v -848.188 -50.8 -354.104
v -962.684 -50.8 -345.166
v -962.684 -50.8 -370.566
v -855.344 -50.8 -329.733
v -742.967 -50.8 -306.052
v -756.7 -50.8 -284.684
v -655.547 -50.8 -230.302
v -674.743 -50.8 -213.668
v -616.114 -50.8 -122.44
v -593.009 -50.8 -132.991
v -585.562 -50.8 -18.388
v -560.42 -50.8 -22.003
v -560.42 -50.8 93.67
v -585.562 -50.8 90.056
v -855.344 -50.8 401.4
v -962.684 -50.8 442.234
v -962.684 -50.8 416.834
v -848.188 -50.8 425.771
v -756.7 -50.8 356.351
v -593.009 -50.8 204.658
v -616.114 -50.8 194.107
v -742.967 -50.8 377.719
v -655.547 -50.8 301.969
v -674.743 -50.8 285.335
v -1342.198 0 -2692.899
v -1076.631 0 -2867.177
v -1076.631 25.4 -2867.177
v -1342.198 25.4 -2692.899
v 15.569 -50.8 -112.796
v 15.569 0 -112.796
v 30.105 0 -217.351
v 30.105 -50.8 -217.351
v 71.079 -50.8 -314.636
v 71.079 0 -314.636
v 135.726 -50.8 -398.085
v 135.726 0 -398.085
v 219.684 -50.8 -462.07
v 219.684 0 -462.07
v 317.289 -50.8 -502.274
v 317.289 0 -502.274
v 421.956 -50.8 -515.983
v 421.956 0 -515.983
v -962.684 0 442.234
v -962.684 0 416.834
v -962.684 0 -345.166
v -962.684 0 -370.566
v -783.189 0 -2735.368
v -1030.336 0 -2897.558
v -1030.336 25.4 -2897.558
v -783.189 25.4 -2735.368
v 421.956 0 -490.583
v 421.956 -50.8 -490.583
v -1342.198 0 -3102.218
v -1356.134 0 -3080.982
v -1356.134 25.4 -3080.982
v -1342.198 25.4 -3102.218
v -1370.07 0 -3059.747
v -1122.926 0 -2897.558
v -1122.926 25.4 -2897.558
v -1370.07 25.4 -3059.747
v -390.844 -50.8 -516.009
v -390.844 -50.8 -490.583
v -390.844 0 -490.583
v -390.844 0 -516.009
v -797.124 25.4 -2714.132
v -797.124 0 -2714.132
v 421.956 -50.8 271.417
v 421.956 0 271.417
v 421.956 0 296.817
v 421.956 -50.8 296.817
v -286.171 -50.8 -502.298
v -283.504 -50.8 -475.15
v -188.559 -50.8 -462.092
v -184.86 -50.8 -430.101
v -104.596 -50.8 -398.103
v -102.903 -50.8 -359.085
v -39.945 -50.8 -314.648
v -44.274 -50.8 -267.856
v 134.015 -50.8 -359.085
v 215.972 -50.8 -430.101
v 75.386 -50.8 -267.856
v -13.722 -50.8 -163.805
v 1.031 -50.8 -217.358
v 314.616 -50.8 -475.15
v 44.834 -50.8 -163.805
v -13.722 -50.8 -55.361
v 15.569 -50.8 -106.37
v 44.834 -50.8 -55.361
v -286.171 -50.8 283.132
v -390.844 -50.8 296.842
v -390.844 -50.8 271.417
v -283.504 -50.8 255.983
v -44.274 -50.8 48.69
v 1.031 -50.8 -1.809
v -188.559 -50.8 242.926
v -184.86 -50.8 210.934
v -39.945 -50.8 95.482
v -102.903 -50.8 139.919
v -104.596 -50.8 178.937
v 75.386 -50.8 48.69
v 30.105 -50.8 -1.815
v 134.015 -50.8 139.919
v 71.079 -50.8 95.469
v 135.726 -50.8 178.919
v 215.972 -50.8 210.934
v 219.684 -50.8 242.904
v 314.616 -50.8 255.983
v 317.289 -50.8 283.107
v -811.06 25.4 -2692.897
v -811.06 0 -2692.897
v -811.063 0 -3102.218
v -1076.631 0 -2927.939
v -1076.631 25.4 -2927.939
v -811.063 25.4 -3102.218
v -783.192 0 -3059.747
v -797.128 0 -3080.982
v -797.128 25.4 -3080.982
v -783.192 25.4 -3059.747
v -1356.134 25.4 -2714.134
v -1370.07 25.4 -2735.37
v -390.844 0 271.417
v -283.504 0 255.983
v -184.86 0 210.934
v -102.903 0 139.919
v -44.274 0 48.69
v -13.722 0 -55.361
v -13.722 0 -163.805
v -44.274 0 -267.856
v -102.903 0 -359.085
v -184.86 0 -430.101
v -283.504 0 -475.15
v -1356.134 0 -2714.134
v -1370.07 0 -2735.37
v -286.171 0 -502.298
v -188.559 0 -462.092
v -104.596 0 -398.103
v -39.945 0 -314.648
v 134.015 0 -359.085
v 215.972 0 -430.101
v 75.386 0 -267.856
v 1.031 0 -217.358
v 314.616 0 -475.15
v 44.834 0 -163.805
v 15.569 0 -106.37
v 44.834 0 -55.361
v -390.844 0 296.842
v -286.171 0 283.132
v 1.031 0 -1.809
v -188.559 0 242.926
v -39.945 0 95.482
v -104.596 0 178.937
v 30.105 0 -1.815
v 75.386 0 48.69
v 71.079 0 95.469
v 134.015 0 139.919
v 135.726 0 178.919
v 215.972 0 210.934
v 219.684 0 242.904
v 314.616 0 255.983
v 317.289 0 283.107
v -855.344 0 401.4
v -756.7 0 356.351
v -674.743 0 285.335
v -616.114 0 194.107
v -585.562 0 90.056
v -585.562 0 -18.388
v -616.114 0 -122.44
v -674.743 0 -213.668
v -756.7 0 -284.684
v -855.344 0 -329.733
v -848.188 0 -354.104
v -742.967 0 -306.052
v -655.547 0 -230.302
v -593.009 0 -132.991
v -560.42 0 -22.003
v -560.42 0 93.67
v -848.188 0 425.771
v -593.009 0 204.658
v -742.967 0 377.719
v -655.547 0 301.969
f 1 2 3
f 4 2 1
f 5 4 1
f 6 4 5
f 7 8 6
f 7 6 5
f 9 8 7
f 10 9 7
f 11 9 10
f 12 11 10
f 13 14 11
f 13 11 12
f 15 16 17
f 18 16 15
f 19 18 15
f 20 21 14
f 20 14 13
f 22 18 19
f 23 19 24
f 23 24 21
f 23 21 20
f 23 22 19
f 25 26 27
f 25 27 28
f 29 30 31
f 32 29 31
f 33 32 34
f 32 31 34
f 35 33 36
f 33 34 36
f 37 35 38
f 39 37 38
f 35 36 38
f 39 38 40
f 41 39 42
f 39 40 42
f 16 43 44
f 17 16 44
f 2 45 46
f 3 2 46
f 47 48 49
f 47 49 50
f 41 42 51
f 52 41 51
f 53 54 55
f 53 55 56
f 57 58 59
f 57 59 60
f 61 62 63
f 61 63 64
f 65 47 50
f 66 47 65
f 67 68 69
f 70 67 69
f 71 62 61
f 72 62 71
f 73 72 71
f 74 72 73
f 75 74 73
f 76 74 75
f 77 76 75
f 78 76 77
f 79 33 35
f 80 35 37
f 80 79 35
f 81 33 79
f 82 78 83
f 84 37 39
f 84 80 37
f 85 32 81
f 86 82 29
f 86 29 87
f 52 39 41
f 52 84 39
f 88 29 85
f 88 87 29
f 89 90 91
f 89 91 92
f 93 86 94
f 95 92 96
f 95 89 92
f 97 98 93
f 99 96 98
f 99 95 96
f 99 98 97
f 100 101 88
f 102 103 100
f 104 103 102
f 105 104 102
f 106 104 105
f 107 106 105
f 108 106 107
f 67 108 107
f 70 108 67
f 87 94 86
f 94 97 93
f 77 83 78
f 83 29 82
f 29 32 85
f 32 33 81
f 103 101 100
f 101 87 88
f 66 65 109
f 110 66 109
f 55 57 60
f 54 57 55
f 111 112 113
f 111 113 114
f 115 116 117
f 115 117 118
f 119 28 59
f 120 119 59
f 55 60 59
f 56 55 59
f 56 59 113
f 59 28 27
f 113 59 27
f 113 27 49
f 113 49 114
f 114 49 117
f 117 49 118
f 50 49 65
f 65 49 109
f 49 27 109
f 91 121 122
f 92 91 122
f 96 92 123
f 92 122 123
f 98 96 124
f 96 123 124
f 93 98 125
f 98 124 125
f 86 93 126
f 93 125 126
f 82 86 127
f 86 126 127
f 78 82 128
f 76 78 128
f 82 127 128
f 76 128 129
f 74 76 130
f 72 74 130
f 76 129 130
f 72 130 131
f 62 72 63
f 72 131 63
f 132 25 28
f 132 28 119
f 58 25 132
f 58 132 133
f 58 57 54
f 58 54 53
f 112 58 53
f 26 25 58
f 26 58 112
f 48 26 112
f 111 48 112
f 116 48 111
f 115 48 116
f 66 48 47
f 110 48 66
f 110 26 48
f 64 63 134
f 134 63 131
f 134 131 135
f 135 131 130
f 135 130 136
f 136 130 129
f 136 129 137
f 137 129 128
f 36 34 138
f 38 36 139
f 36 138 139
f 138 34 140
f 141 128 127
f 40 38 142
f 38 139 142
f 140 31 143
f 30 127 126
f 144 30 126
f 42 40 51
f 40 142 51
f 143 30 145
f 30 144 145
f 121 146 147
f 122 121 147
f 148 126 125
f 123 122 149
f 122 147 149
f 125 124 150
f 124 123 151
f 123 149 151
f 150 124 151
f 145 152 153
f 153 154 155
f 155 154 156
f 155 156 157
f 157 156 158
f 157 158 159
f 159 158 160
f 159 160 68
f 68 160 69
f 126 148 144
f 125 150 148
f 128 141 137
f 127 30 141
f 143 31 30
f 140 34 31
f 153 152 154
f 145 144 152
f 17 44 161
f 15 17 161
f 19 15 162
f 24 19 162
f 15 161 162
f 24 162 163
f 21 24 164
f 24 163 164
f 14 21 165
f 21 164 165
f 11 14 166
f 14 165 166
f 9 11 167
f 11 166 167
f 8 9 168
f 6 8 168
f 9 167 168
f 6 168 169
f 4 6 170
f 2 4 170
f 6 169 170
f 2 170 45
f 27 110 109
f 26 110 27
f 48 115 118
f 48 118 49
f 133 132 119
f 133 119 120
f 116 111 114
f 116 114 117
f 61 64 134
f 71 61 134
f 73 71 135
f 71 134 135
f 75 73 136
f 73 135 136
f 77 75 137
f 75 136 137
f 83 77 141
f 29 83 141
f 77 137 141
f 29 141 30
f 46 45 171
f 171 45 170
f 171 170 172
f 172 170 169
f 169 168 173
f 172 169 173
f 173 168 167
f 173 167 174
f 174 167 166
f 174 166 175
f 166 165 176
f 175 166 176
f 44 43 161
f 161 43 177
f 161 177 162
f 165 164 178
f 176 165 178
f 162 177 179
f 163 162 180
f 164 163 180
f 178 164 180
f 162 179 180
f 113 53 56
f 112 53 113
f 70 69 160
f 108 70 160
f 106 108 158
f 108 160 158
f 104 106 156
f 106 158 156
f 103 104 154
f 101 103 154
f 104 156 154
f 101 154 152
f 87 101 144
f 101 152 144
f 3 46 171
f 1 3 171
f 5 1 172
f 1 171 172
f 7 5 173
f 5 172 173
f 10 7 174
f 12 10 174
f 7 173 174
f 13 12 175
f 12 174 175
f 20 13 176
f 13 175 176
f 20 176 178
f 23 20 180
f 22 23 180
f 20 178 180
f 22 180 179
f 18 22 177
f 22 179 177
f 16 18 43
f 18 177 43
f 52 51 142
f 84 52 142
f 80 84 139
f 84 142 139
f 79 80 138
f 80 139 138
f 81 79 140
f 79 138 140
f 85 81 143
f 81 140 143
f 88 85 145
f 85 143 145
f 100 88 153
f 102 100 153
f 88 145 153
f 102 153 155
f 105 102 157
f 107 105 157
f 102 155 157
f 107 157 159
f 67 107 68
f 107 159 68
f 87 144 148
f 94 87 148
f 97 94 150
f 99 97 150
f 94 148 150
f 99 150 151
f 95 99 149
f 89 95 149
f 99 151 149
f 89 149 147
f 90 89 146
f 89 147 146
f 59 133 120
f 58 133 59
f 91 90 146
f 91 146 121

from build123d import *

# Parameters (mm, degrees)
F1_DEPTH = 50.8
F3_DEPTH = 50.8
F4_DEPTH = 25.4


with BuildPart() as f1:
    # F0 (on Front) → F1 (new body)
    with BuildSketch(Plane.XZ):
        with BuildLine():
            ThreePointArc((15.568727, -106.370451), (-104.596003, 178.936502), (-390.843974, 296.84205))
            Line((-390.843974, 296.84205), (-390.843974, 271.41665))
            ThreePointArc((-390.843974, 271.41665), (-9.843974, -109.58335), (-390.843974, -490.58335))
            Line((-390.843974, -490.58335), (-390.843974, -515.98335))
            Line((-390.843974, -515.98335), (-390.843974, -516.00875))
            ThreePointArc((-390.843974, -516.00875), (-104.596003, -398.103202), (15.568727, -112.796249))
            ThreePointArc((15.568727, -112.796249), (15.556026, -109.58335), (15.568727, -106.370451))
        make_face()
        with BuildLine():
            ThreePointArc((421.956026, 296.81665), (135.726016, 178.918541), (15.568727, -106.370451))
            ThreePointArc((15.568727, -106.370451), (15.556026, -109.58335), (15.568727, -112.796249))
            ThreePointArc((15.568727, -112.796249), (135.726016, -398.085241), (421.956026, -515.98335))
            Line((421.956026, -515.98335), (421.956026, -490.58335))
            ThreePointArc((421.956026, -490.58335), (40.956026, -109.58335), (421.956026, 271.41665))
            Line((421.956026, 271.41665), (421.956026, 296.81665))
        make_face()
    extrude(amount=F1_DEPTH)


with BuildPart() as f3:
    # F2 (on Front) → F3 (new body)
    with BuildSketch(Plane.XZ):
        with BuildLine():
            Line((-962.683797, -345.16645), (-962.683797, -370.56645))
            ThreePointArc((-962.683797, -370.56645), (-556.283797, 35.83355), (-962.683797, 442.23355))
            Line((-962.683797, 442.23355), (-962.683797, 416.83355))
            ThreePointArc((-962.683797, 416.83355), (-581.683797, 35.83355), (-962.683797, -345.16645))
        make_face()
    extrude(amount=F3_DEPTH)


with BuildPart() as f4:
    # F2 (on Front) → F4 (new body)
    with BuildSketch(Plane.XZ):
        Polygon((-783.188568, -2735.367866), (-797.124442, -2714.132249), (-811.060315, -2692.896632), (-1076.630761, -2867.177237), (-1342.198078, -2692.898686), (-1356.133951, -2714.134303), (-1370.069825, -2735.369919), (-1122.92567, -2897.558271), (-1370.069825, -3059.746623), (-1356.133951, -3080.98224), (-1342.198078, -3102.217856), (-1076.630761, -2927.939305), (-811.063445, -3102.217856), (-797.127571, -3080.98224), (-783.191698, -3059.746623), (-1030.335852, -2897.558271), align=None)
    extrude(amount=-F4_DEPTH)


solid = Compound([f1.part, f3.part, f4.part])
